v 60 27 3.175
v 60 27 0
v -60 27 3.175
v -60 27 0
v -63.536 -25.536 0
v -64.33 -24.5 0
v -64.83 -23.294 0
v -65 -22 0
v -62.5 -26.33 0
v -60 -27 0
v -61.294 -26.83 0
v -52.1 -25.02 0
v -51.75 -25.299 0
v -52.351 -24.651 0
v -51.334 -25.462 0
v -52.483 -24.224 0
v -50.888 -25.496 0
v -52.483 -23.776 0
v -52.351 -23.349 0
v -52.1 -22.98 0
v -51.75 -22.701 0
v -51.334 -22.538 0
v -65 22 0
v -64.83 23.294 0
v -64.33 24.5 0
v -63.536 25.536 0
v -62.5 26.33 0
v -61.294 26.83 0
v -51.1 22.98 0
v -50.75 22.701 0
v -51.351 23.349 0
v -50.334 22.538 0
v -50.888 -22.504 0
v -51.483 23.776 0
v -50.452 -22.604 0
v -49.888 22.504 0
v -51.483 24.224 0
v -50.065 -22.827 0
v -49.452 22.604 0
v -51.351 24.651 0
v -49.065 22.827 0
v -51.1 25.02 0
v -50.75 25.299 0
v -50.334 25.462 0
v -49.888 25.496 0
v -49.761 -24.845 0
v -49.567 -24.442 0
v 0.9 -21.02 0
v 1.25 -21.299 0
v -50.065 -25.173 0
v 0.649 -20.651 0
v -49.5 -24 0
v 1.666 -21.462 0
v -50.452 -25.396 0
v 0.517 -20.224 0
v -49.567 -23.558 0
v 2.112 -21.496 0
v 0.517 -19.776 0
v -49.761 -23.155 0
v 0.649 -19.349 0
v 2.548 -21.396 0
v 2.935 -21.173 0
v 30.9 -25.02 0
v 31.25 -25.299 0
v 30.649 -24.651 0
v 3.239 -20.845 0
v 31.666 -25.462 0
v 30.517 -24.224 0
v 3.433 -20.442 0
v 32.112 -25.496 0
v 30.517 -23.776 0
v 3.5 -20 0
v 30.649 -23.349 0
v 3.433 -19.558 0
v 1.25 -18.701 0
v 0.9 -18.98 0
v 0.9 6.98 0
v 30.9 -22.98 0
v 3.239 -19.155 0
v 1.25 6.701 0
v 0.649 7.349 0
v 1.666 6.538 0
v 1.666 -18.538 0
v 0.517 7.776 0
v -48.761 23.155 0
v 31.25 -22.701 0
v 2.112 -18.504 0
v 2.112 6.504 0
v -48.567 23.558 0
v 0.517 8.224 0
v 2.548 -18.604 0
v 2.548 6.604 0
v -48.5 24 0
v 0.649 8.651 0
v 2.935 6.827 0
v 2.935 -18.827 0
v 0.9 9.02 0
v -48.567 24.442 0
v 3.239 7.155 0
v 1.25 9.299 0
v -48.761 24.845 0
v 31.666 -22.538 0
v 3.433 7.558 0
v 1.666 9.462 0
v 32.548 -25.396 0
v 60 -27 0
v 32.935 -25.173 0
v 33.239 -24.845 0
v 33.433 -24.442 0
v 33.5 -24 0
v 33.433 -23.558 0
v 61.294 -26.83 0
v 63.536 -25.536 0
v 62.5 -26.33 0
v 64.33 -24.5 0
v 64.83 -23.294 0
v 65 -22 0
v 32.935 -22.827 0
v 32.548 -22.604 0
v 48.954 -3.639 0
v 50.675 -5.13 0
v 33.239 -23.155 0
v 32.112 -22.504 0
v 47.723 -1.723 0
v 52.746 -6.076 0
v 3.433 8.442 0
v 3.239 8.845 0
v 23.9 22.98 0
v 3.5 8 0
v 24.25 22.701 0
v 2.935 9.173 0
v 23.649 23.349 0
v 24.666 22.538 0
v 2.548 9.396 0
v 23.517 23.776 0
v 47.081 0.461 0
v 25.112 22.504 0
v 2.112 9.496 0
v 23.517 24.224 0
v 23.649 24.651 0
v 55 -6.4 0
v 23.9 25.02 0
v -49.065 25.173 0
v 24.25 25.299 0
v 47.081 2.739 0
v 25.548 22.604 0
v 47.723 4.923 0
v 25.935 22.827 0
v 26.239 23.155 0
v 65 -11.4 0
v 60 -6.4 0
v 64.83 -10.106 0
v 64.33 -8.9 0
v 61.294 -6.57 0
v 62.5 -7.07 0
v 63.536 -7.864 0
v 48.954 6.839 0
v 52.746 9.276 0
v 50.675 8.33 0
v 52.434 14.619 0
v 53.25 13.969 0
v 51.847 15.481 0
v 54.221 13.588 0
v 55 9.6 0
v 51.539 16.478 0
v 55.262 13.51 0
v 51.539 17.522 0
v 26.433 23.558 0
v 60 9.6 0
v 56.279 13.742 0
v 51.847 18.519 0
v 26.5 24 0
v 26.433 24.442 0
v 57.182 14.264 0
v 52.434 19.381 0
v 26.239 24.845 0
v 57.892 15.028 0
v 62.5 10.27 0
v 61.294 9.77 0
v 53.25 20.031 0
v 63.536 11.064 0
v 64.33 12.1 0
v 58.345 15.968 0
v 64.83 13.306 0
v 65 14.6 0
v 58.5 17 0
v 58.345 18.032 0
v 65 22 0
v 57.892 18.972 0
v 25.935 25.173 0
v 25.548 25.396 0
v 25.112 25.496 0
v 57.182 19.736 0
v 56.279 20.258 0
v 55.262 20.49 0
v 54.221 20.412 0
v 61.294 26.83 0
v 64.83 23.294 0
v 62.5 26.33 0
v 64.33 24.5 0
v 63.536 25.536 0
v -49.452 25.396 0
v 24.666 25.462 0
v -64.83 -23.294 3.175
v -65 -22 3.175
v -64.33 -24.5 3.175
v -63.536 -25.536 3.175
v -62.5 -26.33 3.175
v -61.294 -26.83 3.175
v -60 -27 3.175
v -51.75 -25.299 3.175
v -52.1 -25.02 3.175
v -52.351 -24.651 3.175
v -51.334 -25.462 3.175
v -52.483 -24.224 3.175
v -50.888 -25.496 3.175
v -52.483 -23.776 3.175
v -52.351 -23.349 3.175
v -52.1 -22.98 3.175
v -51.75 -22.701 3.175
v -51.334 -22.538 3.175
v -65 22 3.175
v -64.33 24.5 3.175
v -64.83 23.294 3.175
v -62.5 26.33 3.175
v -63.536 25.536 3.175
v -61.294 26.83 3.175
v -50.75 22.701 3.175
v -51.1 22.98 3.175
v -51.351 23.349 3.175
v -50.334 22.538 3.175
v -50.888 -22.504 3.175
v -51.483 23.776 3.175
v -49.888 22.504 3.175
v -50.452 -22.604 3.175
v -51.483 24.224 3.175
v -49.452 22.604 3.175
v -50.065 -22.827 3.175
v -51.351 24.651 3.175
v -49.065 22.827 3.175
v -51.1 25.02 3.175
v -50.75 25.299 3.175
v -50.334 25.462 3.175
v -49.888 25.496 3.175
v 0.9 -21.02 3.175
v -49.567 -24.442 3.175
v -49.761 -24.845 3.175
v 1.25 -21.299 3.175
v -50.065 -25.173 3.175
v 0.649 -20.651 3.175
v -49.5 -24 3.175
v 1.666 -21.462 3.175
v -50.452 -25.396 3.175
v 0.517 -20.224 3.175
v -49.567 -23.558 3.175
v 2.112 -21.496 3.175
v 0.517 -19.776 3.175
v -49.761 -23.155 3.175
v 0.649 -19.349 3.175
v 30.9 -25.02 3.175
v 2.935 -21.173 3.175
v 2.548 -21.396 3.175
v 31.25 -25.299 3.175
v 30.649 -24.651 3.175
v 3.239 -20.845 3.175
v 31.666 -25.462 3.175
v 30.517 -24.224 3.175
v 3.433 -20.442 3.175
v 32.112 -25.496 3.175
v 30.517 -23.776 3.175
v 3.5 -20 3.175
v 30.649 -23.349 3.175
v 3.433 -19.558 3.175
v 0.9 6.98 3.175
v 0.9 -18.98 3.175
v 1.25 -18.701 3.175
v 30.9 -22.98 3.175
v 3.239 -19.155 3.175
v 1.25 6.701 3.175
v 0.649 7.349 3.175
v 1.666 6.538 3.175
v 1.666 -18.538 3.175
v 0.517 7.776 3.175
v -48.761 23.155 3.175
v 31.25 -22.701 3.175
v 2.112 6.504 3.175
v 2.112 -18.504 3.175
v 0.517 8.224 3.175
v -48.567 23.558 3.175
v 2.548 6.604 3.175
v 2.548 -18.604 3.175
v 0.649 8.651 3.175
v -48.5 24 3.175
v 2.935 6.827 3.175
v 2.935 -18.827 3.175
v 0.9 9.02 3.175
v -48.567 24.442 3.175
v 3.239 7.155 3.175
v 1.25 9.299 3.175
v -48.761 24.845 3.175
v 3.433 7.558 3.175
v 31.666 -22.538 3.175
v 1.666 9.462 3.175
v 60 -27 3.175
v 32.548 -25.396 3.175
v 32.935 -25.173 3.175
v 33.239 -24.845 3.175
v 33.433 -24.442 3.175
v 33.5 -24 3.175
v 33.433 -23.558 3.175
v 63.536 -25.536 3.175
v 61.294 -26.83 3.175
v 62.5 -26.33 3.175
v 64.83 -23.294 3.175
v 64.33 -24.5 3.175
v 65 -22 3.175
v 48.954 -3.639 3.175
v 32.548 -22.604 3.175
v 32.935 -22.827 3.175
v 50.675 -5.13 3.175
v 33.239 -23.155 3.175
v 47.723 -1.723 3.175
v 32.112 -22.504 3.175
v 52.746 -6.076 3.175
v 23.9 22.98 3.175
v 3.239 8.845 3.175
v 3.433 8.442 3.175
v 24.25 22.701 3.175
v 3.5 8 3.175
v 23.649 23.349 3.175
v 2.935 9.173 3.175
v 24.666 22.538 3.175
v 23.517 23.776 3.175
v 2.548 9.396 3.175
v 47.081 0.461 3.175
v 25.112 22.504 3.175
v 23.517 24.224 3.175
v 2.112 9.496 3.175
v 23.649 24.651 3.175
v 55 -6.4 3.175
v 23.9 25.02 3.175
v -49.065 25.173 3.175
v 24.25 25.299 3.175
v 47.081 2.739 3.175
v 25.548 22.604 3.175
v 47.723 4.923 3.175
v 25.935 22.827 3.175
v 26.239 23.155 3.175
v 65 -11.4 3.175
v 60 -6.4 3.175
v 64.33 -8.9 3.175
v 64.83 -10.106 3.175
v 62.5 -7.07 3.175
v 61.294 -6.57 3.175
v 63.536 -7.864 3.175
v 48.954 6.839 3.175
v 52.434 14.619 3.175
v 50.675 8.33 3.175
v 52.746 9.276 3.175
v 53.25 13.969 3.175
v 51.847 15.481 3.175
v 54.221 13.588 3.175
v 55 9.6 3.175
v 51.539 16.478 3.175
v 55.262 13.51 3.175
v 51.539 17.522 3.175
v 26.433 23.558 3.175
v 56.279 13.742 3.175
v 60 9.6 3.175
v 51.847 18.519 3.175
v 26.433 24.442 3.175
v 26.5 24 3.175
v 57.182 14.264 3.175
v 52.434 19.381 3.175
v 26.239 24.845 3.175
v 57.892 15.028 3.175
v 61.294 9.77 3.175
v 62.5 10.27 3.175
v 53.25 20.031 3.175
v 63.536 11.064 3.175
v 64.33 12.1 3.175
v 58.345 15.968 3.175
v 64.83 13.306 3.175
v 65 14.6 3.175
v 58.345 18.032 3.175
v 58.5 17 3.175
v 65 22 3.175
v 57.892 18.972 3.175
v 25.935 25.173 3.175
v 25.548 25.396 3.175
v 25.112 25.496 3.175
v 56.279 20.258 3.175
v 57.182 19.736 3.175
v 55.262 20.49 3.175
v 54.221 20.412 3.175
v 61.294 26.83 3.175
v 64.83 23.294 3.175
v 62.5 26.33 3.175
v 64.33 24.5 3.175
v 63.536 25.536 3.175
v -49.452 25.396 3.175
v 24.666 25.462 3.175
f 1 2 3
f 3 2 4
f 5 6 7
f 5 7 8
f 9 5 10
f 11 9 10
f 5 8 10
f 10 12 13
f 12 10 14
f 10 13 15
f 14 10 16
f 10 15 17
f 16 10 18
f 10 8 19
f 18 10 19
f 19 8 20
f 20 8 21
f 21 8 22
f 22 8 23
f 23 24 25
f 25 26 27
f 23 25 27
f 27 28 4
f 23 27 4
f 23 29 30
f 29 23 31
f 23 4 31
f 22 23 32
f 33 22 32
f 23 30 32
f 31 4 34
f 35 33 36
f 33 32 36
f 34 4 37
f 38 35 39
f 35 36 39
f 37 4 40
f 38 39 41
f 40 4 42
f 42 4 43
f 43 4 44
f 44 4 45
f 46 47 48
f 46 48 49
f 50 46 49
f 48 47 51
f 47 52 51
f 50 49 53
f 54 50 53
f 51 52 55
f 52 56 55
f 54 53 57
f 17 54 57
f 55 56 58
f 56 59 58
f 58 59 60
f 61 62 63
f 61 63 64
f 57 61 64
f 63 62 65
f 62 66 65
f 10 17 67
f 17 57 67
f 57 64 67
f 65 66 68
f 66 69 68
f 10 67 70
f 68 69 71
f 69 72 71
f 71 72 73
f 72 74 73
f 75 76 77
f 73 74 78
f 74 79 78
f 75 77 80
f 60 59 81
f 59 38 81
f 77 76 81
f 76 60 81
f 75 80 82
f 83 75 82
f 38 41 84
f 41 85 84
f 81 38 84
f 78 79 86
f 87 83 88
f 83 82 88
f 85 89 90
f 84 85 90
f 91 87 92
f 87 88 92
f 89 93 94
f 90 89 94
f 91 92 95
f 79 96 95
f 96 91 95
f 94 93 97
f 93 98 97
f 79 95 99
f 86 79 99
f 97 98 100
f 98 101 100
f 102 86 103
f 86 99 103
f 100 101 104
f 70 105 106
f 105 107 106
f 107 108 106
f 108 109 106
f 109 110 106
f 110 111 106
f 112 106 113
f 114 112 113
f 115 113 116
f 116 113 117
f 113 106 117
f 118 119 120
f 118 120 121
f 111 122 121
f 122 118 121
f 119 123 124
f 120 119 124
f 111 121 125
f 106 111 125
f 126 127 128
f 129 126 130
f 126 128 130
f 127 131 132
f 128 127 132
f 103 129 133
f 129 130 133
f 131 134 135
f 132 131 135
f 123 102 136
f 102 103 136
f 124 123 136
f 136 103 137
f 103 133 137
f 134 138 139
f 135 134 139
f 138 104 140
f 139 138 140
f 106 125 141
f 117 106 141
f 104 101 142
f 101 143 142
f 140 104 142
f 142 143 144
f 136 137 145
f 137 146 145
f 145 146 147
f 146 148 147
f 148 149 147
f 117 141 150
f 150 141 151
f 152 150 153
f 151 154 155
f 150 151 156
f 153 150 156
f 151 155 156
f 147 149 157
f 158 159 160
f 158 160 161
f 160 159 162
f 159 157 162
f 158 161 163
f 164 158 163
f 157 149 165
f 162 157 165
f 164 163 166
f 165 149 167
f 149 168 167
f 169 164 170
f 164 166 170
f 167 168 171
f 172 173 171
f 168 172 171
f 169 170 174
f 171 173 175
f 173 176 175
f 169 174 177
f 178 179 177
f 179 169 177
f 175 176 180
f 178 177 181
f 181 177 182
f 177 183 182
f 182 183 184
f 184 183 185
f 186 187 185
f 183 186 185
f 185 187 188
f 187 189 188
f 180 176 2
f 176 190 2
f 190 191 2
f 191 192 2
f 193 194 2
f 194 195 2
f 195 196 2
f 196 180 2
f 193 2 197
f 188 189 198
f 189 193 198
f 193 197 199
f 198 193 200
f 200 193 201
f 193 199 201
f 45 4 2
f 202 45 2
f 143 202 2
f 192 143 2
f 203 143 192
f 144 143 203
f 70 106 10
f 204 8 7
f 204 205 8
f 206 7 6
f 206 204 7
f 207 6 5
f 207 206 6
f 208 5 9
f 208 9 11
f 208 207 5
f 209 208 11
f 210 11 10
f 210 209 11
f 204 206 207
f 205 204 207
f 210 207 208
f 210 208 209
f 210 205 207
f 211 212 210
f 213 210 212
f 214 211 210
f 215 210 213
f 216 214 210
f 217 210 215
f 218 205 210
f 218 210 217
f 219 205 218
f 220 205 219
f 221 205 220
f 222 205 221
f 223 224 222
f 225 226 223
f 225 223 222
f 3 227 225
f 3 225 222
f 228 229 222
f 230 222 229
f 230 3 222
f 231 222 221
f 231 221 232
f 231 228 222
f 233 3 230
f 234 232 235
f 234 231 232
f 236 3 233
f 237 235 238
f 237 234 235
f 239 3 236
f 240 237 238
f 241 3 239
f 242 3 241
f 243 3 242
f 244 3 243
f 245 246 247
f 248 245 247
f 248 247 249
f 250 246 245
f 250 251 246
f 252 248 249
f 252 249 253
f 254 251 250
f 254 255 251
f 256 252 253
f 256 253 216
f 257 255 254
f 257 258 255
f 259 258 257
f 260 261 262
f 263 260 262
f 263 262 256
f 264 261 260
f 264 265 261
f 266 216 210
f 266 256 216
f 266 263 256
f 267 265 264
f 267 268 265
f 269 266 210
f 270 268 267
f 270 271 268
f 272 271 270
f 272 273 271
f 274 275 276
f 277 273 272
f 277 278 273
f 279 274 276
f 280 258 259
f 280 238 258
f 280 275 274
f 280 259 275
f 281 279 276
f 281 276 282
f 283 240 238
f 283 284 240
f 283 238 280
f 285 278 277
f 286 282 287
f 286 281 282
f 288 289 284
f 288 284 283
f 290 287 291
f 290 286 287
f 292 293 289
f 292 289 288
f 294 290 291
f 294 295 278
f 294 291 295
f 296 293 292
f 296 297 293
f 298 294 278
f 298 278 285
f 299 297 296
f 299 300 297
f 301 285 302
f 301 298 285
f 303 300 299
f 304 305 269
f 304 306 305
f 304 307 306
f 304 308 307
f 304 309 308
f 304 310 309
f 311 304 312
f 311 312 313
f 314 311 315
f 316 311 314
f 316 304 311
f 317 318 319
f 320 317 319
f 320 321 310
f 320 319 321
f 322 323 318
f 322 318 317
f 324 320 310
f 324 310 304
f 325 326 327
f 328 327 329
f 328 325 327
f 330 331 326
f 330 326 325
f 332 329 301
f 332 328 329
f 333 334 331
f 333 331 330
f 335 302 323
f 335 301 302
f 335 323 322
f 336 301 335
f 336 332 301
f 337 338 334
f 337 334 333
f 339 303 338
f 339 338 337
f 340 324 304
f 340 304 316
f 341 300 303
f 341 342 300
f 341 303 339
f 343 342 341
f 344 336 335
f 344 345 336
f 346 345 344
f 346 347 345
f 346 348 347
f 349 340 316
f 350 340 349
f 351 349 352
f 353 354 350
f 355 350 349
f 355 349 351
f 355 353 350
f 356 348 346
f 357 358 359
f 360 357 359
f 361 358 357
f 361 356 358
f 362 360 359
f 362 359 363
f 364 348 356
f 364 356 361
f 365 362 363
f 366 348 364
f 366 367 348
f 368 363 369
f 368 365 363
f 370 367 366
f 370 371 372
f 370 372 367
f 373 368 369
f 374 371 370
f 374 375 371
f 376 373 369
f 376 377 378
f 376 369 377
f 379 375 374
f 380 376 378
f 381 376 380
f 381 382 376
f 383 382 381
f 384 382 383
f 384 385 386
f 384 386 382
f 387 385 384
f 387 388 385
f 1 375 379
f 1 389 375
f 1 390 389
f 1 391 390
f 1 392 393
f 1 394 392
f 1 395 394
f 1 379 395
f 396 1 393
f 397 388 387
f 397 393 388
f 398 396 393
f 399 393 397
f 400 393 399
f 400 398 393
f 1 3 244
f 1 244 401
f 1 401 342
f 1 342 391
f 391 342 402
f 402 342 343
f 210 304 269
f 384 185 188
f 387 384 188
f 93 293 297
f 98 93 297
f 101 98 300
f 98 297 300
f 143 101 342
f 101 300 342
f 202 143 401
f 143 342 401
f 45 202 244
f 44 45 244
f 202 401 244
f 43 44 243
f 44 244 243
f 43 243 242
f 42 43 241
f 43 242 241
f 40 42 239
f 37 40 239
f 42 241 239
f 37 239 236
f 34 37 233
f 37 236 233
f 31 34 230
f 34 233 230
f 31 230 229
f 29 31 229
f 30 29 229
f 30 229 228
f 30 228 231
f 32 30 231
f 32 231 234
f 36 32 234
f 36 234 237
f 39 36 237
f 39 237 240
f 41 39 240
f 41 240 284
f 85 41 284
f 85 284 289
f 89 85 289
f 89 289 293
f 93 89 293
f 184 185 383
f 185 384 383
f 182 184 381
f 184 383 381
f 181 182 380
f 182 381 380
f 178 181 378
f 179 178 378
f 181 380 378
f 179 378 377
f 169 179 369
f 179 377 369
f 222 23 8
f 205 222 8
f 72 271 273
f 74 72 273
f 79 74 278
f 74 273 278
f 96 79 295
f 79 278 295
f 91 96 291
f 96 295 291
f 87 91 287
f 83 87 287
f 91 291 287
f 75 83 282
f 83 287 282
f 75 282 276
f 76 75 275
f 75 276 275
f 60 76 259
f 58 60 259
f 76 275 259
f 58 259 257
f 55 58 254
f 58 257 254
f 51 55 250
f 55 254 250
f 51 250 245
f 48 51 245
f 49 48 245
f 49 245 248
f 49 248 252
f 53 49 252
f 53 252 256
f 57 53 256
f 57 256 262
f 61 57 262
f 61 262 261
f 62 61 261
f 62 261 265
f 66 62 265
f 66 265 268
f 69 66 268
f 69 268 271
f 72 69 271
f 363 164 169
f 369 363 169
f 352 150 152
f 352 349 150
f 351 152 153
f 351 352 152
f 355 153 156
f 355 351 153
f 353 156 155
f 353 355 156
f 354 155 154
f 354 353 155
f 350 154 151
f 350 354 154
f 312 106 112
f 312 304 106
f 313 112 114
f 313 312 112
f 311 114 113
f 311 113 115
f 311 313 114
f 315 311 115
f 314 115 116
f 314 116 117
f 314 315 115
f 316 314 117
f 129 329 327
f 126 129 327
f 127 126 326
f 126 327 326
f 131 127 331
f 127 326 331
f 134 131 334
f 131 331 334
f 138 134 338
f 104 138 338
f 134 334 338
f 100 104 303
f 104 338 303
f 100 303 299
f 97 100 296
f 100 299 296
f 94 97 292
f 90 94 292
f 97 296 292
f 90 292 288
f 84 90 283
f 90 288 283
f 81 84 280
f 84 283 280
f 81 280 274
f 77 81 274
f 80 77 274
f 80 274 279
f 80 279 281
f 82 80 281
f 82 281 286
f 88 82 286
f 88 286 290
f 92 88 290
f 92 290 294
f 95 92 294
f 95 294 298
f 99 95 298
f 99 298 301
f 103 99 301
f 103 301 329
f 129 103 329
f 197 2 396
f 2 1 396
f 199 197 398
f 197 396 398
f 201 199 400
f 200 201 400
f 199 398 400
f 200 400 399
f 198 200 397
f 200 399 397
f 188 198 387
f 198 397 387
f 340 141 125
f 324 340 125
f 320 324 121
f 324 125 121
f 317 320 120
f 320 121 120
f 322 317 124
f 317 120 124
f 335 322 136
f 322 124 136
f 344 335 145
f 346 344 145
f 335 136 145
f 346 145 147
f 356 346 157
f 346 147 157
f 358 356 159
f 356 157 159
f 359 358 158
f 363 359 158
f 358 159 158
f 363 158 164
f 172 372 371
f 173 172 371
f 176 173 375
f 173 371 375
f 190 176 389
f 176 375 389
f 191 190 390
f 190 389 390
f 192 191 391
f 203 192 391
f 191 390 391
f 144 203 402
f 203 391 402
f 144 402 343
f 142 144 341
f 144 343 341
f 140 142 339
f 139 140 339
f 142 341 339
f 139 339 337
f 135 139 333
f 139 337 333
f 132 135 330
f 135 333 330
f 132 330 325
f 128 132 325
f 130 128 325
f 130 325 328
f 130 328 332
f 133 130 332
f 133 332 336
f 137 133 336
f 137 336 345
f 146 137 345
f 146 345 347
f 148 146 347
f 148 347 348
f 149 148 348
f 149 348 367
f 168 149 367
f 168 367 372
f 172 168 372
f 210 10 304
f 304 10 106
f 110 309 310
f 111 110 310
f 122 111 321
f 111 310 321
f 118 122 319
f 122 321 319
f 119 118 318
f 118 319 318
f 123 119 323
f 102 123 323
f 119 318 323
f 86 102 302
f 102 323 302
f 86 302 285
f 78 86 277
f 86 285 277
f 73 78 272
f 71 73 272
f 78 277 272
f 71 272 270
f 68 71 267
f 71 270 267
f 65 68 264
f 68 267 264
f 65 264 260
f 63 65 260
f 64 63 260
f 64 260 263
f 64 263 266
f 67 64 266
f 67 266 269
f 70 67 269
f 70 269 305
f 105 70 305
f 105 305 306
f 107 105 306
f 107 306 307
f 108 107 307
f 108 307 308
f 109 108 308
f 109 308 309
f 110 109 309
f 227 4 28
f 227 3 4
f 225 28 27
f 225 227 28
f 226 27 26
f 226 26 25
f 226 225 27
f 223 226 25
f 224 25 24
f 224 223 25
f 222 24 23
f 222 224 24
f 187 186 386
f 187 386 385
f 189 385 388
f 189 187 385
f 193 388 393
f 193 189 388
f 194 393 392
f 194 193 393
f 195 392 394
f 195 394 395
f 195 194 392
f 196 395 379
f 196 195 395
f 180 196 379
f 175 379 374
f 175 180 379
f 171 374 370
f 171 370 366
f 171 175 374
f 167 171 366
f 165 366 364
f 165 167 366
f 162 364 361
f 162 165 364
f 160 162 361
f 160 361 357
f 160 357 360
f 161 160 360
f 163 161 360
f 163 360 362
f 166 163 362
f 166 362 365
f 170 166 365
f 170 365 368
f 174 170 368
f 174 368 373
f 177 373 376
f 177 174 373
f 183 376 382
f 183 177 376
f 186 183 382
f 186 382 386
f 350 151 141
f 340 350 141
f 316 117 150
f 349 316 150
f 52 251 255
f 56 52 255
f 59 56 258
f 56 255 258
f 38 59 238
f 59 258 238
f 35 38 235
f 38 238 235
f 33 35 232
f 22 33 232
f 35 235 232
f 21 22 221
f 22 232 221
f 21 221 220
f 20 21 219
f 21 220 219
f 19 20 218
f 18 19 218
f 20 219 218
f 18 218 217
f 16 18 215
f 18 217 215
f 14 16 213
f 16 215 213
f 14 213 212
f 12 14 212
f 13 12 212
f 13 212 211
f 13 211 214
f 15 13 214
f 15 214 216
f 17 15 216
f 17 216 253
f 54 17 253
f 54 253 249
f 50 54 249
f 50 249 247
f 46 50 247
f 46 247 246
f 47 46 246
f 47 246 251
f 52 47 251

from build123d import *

# Parameters (mm, degrees)
F0_R     = 3.5
F1_DEPTH = 3.175
F3_R     = 5
F2_R     = 1.5
F4_DEPTH = 25


with BuildPart() as f1:
    # F0 (on Top) → F1 (new body)
    with BuildSketch(Plane.XY):
        with BuildLine():
            Line((65, 27), (-65, 27))
            Line((-65, 27), (-65, -27))
            Line((-65, -27), (65, -27))
            Line((65, -27), (65, -6.4))
            Line((65, -6.4), (55, -6.4))
            ThreePointArc((55, -6.4), (47, 1.6), (55, 9.6))
            Line((55, 9.6), (65, 9.6))
            Line((65, 9.6), (65, 27))
        make_face()
        with Locations((55, 17)):
            Circle(F0_R, mode=Mode.SUBTRACT)
    extrude(amount=F1_DEPTH)

    # F3
    f3_edges = [f1.edges().sort_by_distance(p)[0] for p in [
        (-65, -27, 1.5875),
        (-65, 27, 1.5875),
        (65, -27, 1.5875),
        (65, -6.4, 1.5875),
        (65, 9.6, 1.5875),
        (65, 27, 1.5875),
    ]]
    fillet(f3_edges, radius=F3_R)

    # F2 (on face) → F4 (cut)
    with BuildSketch(Plane.XY.offset(3.175)):
        with Locations((25, 24)):
            Circle(F2_R)
        with Locations((2, 8)):
            Circle(F2_R)
        with Locations((32, -24)):
            Circle(F2_R)
        with Locations((2, -20)):
            Circle(F2_R)
        with Locations((-50, 24)):
            Circle(F2_R)
        with Locations((-51, -24)):
            Circle(F2_R)
    extrude(amount=-F4_DEPTH, mode=Mode.SUBTRACT)


solid = f1.part
